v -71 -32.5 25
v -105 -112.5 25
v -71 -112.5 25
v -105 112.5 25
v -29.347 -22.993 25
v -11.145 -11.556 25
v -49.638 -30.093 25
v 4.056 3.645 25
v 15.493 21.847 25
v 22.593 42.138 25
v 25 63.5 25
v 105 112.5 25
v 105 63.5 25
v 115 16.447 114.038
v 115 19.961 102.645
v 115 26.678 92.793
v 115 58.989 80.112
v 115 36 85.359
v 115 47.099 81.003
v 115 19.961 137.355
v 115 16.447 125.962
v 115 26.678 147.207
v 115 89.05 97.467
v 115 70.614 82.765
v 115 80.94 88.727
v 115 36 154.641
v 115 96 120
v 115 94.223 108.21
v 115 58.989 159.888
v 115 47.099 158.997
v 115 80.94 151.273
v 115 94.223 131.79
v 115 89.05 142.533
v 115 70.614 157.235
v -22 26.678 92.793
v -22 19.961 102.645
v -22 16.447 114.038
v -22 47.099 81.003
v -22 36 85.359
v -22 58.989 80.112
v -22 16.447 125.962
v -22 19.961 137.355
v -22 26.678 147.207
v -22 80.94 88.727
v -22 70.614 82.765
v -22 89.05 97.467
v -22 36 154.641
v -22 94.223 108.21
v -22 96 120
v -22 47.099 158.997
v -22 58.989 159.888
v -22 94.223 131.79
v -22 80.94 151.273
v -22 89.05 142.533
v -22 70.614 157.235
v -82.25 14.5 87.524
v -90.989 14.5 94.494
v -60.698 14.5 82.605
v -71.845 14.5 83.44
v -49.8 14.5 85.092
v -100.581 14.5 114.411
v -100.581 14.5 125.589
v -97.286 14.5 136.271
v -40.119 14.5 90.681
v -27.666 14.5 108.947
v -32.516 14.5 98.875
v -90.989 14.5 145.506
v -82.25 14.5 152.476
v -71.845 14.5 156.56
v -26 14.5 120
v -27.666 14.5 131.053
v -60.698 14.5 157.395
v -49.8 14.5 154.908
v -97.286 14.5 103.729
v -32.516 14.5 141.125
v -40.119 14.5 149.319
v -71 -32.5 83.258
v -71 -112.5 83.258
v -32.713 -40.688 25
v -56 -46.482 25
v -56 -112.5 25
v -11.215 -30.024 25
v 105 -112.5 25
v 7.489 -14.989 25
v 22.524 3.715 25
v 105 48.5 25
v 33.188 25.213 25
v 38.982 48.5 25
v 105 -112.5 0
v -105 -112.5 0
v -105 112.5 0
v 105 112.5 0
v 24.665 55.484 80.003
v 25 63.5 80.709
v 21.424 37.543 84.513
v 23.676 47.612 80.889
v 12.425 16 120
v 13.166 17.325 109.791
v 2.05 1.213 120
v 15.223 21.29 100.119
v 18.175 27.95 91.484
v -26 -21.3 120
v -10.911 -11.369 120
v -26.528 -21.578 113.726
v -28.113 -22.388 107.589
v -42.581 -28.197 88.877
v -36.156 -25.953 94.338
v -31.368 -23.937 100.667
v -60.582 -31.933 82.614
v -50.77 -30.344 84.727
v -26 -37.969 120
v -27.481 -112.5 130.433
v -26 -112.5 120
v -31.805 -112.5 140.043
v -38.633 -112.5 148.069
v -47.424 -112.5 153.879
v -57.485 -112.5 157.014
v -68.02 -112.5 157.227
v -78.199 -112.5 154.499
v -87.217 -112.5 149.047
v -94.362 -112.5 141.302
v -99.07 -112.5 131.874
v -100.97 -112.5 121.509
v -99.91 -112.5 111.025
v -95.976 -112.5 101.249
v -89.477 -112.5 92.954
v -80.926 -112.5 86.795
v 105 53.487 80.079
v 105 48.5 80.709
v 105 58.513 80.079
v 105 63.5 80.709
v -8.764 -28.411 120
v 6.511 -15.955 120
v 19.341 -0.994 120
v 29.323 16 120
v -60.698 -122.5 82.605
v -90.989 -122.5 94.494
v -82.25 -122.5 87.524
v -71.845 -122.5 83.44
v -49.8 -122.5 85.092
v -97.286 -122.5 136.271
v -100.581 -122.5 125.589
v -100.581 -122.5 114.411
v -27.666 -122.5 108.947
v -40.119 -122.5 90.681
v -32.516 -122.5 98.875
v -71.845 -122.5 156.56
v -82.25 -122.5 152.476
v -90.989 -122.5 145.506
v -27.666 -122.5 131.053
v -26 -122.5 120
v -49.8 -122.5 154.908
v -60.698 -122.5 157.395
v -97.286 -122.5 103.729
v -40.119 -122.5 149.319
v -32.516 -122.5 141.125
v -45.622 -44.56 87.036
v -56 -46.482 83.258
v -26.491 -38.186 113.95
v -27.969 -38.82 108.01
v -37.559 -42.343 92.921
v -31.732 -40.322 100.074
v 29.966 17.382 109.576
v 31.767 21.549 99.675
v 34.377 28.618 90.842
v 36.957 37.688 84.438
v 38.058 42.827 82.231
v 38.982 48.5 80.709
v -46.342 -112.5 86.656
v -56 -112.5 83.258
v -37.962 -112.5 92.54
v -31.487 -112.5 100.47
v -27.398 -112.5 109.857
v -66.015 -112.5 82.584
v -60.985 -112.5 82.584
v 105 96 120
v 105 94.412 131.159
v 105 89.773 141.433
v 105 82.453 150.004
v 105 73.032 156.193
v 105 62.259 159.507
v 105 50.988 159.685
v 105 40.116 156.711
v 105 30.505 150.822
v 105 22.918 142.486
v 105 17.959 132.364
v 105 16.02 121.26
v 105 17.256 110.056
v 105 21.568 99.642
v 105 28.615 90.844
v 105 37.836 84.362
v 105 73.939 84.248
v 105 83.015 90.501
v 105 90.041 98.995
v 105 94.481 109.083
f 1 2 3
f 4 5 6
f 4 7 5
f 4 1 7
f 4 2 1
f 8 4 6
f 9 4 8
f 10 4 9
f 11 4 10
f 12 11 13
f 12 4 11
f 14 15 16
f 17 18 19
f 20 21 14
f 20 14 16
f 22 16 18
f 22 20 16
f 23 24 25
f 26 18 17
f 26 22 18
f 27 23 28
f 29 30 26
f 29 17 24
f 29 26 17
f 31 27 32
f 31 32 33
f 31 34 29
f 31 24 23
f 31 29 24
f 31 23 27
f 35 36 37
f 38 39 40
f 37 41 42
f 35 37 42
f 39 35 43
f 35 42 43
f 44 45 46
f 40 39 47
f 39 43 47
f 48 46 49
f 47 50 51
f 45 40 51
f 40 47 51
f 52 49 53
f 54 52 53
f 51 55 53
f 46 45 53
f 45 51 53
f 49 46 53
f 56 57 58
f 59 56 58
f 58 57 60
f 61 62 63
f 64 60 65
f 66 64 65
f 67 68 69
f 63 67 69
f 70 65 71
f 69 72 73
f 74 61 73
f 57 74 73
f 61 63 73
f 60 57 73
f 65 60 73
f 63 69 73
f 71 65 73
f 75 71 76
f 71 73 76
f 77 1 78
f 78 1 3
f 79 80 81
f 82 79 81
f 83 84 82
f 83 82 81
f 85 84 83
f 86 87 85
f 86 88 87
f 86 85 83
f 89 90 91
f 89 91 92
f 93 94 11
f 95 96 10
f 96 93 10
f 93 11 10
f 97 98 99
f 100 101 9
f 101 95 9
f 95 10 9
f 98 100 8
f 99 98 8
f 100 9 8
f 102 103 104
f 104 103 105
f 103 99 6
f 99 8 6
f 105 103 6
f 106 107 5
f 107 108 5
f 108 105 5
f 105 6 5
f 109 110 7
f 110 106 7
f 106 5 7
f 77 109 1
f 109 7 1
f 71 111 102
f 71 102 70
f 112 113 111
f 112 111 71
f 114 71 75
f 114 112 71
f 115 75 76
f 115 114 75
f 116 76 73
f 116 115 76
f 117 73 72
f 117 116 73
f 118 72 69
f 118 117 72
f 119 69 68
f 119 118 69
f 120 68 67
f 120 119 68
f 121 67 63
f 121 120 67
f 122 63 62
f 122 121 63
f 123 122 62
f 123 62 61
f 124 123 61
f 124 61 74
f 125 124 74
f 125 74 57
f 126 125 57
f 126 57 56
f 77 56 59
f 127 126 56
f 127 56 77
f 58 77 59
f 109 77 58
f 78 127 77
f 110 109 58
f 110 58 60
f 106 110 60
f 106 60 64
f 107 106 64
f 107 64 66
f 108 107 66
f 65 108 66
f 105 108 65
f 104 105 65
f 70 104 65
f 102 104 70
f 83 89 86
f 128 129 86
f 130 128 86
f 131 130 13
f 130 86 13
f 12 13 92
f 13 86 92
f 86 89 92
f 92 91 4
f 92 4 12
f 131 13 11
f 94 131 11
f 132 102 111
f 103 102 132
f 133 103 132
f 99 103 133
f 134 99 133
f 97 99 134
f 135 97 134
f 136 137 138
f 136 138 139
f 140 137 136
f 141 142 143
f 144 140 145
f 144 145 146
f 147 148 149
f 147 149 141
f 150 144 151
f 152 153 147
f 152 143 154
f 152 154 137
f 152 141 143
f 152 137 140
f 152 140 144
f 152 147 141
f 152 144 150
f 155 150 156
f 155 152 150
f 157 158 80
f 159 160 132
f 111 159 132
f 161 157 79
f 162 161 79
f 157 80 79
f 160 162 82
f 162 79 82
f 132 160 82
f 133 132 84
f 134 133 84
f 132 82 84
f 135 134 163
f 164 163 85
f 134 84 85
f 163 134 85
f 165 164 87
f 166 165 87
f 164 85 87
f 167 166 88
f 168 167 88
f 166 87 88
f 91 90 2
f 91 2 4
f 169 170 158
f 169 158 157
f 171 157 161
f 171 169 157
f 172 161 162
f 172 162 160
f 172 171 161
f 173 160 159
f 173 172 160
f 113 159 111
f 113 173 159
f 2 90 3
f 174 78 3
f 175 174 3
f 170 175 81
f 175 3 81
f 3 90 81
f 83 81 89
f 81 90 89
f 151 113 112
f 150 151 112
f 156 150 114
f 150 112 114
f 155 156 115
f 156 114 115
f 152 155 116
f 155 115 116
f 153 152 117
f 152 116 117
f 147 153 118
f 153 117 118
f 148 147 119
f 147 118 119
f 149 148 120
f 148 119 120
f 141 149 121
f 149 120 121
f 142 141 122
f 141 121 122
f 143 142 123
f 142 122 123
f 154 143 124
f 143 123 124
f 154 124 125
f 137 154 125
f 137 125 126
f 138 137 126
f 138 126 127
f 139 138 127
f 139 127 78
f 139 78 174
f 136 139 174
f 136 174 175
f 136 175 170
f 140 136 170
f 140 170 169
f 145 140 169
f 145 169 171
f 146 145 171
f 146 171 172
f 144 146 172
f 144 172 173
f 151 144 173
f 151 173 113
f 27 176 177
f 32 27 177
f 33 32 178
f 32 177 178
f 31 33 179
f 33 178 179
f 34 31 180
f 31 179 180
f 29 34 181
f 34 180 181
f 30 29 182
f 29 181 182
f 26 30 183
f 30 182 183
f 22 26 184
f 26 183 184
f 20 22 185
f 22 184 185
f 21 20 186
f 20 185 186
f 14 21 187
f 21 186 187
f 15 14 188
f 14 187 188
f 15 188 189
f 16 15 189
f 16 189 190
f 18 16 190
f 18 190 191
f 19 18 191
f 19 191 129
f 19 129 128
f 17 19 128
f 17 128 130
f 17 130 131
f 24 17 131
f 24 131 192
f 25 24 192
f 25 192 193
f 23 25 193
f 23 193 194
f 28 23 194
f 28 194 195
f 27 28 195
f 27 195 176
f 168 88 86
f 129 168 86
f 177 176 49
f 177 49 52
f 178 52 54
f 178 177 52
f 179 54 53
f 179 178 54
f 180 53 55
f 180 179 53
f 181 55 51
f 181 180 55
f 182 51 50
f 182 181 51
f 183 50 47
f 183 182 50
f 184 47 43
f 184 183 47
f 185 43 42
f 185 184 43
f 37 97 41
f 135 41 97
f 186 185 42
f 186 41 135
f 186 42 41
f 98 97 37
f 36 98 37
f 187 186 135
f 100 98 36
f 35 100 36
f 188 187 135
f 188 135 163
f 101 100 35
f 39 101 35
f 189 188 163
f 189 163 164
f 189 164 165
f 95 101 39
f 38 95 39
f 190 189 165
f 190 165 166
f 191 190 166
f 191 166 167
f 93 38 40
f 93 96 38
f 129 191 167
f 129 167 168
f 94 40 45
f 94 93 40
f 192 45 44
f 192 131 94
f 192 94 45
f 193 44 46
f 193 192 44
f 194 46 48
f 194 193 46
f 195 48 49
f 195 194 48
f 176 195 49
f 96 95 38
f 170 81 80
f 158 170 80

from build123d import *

# Parameters (mm, degrees)
F0_W          = 210
F0_H          = 225
F1_DEPTH      = 25
F3_DEPTH      = 95
F4_R          = 40
F5_DEPTH      = 10
F5_DEPTH_BACK = 127
F6_R          = 37.5
F7_DEPTH      = 10
F7_DEPTH_BACK = 127


with BuildPart() as f1:
    # F0 (on Top) → F1 (new body)
    with BuildSketch(Plane.XY):
        Rectangle(F0_W, F0_H)
    extrude(amount=F1_DEPTH)

    # F2 (on face) → F3 (join)
    with BuildSketch(Plane.XY.offset(25)):
        with BuildLine():
            Line((-71, -32.5), (-71, -112.5))
            Line((-71, -112.5), (-56, -112.5))
            Line((-56, -112.5), (-56, -46.4818166789))
            ThreePointArc((-56, -46.4818166789), (7.4888527117, -14.9888527117), (38.9818166789, 48.5))
            Line((38.9818166789, 48.5), (105, 48.5))
            Line((105, 48.5), (105, 63.5))
            Line((105, 63.5), (25, 63.5))
            ThreePointArc((25, 63.5), (-3.1177490061, -4.3822509939), (-71, -32.5))
        make_face()
    extrude(amount=F3_DEPTH)

    # F4 (on face) → F5 (join, two sides)
    with BuildSketch(Plane.YZ.offset(105)) as f5_sk:
        with Locations((56, 120)):
            Circle(F4_R)
    extrude(amount=F5_DEPTH)
    extrude(f5_sk.sketch, amount=-F5_DEPTH_BACK)

    # F6 (on face) → F7 (join, two sides)
    with BuildSketch(Plane.XZ.offset(112.5)) as f7_sk:
        with Locations((-63.5, 120)):
            Circle(F6_R)
        with BuildLine():
            ThreePointArc((-56, 83.2576538583), (-34.4526249034, 96.2829175487), (-26, 120))
            ThreePointArc((-26, 120), (-87.2170824513, 149.0473750966), (-71, 83.2576538583))
            Line((-71, 83.2576538583), (-71, 120))
            Line((-71, 120), (-56, 120))
            Line((-56, 120), (-56, 83.2576538583))
        make_face()
    extrude(amount=F7_DEPTH)
    extrude(f7_sk.sketch, amount=-F7_DEPTH_BACK)


solid = f1.part
